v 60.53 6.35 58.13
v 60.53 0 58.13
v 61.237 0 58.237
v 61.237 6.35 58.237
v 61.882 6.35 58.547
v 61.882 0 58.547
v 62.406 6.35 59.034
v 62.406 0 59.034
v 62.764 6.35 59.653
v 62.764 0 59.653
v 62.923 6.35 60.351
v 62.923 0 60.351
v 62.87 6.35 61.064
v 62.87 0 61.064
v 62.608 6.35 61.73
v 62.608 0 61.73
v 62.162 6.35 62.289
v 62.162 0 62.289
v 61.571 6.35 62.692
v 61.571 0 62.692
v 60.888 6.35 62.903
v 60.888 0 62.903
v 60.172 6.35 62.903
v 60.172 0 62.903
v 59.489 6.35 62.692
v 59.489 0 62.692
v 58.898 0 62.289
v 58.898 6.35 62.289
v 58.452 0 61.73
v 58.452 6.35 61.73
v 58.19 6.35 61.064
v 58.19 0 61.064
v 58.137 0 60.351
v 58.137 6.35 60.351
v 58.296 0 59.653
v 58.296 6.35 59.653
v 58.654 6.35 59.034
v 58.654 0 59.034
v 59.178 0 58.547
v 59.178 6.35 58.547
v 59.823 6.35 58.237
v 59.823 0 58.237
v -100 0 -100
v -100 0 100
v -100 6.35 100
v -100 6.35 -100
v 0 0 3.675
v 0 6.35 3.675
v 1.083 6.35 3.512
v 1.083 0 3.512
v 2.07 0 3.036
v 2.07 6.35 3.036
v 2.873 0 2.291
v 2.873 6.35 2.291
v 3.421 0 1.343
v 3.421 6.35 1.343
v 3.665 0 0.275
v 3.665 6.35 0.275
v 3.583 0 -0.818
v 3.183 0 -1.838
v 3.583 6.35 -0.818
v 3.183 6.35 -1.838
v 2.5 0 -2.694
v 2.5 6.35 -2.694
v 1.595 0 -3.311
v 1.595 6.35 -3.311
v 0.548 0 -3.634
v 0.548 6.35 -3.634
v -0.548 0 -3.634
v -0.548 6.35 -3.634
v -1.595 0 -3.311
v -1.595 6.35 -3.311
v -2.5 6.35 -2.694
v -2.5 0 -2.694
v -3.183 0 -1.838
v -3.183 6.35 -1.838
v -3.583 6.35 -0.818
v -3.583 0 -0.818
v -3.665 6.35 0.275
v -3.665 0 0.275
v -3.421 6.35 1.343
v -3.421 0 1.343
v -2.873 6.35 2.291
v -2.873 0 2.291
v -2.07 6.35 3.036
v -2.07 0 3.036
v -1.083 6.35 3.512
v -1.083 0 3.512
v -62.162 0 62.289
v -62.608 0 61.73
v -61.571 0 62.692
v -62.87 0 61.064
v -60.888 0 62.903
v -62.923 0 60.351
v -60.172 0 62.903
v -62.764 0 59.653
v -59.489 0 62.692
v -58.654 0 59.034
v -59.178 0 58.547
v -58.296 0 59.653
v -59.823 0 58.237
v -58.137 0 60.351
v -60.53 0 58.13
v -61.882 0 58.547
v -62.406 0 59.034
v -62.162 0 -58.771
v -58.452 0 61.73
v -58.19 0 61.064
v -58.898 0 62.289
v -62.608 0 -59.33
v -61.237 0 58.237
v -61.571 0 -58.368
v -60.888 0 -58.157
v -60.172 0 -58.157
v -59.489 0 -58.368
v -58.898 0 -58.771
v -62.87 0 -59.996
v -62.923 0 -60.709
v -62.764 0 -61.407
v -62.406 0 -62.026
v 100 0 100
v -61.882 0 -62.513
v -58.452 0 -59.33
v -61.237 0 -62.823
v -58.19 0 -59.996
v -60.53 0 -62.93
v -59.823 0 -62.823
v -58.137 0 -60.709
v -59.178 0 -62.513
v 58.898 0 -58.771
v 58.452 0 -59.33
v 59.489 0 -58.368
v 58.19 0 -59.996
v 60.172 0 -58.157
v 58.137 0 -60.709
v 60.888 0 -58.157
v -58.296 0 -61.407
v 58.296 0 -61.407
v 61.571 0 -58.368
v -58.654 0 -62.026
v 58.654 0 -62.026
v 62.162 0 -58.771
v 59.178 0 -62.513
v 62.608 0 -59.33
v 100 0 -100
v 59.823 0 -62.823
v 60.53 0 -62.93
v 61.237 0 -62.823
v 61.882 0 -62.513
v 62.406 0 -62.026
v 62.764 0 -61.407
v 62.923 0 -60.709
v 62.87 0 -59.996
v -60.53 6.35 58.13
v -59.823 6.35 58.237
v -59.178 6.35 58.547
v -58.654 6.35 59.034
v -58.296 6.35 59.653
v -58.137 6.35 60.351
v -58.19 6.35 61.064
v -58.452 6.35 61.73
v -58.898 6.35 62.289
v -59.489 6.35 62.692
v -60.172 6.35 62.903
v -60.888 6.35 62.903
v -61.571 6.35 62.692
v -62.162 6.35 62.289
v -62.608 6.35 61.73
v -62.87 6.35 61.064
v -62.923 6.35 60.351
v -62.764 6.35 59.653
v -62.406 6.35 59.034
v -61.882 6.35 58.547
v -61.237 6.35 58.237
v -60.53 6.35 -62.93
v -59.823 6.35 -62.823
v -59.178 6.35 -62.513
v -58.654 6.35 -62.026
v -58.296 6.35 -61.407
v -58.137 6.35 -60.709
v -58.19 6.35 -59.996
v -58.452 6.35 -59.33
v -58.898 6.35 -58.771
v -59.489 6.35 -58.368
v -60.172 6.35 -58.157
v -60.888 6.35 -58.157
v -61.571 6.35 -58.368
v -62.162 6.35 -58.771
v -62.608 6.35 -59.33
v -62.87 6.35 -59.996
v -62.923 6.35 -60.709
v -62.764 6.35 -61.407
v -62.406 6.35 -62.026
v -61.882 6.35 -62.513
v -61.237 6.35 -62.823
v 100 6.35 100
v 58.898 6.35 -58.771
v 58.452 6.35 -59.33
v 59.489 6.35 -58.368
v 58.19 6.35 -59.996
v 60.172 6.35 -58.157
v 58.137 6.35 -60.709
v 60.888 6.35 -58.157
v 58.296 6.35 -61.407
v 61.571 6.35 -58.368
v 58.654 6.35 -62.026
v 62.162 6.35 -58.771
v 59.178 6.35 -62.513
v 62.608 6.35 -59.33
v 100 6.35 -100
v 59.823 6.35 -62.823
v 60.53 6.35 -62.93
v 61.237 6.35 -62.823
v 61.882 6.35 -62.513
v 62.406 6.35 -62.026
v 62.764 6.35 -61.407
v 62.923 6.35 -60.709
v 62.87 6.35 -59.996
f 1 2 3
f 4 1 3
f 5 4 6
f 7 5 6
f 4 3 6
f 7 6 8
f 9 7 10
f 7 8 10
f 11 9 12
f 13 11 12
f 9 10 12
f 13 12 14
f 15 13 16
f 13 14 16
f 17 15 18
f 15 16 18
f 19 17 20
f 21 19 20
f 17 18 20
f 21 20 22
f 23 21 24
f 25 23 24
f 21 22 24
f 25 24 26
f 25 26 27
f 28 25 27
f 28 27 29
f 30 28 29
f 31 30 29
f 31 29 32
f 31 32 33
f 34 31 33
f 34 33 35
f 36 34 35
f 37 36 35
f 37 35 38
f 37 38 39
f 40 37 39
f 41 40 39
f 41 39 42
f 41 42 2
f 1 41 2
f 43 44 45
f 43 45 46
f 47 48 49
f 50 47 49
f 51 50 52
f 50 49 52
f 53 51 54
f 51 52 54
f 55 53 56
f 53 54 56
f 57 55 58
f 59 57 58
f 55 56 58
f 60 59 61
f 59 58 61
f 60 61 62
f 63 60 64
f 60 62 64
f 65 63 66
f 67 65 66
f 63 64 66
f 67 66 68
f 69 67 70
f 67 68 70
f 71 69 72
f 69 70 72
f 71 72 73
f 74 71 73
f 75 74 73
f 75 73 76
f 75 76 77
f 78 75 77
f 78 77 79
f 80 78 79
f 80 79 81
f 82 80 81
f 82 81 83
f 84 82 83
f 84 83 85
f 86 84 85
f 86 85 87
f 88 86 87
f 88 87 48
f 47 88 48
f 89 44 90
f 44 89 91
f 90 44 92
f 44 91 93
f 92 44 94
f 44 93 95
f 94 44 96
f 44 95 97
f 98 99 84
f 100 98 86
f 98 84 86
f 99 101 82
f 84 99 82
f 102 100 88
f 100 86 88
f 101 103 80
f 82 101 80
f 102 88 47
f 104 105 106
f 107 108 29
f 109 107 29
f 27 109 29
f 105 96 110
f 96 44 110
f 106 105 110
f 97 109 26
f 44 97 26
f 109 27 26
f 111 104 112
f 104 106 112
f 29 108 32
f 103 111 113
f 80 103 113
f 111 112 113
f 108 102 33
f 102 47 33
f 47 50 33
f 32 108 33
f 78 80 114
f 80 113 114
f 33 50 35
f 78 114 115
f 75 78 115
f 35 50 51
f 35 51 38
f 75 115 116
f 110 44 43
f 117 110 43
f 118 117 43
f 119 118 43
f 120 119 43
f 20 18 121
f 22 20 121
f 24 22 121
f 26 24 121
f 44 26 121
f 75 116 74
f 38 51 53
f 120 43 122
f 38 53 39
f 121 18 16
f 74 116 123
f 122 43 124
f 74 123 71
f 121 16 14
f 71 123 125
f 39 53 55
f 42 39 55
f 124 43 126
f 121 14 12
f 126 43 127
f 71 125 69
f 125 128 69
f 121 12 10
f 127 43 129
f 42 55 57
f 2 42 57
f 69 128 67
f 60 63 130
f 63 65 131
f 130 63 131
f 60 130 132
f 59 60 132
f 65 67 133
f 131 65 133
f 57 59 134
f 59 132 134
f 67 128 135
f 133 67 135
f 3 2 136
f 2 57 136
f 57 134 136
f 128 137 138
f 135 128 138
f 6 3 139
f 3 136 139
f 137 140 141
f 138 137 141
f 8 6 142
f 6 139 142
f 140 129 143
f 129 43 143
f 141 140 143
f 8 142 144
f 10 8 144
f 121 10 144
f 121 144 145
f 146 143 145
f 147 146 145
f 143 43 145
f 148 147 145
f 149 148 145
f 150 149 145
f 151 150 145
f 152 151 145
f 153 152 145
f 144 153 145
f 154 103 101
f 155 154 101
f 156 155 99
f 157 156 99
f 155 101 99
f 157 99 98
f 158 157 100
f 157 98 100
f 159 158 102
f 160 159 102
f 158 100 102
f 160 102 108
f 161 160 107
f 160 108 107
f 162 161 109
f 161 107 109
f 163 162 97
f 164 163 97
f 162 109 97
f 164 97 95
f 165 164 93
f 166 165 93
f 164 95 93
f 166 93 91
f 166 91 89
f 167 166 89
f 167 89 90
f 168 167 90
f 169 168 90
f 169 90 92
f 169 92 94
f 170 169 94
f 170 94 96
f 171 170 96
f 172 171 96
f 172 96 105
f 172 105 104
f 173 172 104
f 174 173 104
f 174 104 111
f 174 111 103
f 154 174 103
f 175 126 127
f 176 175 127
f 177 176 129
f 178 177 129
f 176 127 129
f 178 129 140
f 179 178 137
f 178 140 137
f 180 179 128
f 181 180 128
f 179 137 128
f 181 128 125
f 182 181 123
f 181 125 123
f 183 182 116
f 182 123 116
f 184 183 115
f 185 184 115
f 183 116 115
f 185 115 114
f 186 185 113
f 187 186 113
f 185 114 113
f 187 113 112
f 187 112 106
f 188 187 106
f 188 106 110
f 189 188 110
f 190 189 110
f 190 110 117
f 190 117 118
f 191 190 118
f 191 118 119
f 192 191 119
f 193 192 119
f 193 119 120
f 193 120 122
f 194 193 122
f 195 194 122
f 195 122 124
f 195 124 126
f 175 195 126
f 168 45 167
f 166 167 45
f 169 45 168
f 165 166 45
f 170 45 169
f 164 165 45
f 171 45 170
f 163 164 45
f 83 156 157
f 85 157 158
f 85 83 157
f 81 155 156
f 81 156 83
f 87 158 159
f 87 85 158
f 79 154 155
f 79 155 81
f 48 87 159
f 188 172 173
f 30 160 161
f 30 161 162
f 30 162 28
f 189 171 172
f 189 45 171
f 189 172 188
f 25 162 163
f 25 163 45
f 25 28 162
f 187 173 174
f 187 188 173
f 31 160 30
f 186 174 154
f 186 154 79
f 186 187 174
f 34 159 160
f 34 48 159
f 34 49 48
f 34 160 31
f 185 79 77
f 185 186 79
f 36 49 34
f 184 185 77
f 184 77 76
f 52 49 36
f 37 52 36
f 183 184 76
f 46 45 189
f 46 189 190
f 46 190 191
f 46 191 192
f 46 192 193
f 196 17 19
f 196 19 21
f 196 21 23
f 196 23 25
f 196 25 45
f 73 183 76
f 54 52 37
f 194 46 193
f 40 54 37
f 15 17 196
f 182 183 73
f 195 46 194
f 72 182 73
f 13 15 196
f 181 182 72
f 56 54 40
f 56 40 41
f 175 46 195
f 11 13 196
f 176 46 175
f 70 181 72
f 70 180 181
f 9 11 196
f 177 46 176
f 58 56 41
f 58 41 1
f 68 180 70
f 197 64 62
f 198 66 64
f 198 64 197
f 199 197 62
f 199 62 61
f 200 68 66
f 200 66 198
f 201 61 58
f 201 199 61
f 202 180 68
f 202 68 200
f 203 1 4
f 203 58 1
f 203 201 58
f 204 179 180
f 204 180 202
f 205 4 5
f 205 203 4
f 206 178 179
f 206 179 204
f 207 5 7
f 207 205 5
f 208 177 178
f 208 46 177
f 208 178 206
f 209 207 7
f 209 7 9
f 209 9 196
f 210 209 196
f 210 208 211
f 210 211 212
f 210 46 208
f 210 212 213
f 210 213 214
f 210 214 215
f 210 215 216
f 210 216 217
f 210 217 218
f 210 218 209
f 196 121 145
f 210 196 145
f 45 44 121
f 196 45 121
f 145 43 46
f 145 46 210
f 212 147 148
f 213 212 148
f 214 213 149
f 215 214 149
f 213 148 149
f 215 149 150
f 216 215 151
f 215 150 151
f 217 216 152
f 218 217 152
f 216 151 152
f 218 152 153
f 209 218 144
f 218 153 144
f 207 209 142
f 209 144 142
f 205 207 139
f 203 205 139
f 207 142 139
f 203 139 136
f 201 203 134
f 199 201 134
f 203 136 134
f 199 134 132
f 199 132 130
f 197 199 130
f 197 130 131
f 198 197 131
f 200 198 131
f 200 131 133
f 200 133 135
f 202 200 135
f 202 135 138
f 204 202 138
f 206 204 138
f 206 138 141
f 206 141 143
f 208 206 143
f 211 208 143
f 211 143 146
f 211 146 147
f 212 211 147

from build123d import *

# Parameters (mm, degrees)
SKETCH1_W            = 200
SKETCH1_H            = 200
BOSS_EXTRUDE1_DEPTH  = 6.35
SKETCH2_R            = 3.675
CUT_EXTRUDE1_DEPTH   = 142.56384602
M4_CLEARANCE_HOLE1_D = 4.8


with BuildPart() as part:
    # Sketch1 → Boss-Extrude1 (new body)
    with BuildSketch(Plane(origin=(0, 0, 0), x_dir=(1, 0, 0), z_dir=(0, 1, 0))):
        Rectangle(SKETCH1_W, SKETCH1_H)
    extrude(amount=BOSS_EXTRUDE1_DEPTH)

    # Sketch2 → Cut-Extrude1 (cut, through all)
    with BuildSketch(Plane(origin=(0, 6.35, 0), x_dir=(1, 0, 0), z_dir=(0, 1, 0))):
        with Locations(Location((0, 0, 0), (0, 0, 270))):
            Circle(SKETCH2_R)
    extrude(amount=-CUT_EXTRUDE1_DEPTH, mode=Mode.SUBTRACT)

    # M4 Clearance Hole1 (through all)
    with Locations(Plane(origin=(-60.53, 6.35, -60.53), x_dir=(0, 0, 1), z_dir=(0, 1, 0))):
        with Locations((0, 0), (0, 121.06), (121.06, 121.06), (121.06, 0)):
            Hole(M4_CLEARANCE_HOLE1_D / 2)


solid = part.part
